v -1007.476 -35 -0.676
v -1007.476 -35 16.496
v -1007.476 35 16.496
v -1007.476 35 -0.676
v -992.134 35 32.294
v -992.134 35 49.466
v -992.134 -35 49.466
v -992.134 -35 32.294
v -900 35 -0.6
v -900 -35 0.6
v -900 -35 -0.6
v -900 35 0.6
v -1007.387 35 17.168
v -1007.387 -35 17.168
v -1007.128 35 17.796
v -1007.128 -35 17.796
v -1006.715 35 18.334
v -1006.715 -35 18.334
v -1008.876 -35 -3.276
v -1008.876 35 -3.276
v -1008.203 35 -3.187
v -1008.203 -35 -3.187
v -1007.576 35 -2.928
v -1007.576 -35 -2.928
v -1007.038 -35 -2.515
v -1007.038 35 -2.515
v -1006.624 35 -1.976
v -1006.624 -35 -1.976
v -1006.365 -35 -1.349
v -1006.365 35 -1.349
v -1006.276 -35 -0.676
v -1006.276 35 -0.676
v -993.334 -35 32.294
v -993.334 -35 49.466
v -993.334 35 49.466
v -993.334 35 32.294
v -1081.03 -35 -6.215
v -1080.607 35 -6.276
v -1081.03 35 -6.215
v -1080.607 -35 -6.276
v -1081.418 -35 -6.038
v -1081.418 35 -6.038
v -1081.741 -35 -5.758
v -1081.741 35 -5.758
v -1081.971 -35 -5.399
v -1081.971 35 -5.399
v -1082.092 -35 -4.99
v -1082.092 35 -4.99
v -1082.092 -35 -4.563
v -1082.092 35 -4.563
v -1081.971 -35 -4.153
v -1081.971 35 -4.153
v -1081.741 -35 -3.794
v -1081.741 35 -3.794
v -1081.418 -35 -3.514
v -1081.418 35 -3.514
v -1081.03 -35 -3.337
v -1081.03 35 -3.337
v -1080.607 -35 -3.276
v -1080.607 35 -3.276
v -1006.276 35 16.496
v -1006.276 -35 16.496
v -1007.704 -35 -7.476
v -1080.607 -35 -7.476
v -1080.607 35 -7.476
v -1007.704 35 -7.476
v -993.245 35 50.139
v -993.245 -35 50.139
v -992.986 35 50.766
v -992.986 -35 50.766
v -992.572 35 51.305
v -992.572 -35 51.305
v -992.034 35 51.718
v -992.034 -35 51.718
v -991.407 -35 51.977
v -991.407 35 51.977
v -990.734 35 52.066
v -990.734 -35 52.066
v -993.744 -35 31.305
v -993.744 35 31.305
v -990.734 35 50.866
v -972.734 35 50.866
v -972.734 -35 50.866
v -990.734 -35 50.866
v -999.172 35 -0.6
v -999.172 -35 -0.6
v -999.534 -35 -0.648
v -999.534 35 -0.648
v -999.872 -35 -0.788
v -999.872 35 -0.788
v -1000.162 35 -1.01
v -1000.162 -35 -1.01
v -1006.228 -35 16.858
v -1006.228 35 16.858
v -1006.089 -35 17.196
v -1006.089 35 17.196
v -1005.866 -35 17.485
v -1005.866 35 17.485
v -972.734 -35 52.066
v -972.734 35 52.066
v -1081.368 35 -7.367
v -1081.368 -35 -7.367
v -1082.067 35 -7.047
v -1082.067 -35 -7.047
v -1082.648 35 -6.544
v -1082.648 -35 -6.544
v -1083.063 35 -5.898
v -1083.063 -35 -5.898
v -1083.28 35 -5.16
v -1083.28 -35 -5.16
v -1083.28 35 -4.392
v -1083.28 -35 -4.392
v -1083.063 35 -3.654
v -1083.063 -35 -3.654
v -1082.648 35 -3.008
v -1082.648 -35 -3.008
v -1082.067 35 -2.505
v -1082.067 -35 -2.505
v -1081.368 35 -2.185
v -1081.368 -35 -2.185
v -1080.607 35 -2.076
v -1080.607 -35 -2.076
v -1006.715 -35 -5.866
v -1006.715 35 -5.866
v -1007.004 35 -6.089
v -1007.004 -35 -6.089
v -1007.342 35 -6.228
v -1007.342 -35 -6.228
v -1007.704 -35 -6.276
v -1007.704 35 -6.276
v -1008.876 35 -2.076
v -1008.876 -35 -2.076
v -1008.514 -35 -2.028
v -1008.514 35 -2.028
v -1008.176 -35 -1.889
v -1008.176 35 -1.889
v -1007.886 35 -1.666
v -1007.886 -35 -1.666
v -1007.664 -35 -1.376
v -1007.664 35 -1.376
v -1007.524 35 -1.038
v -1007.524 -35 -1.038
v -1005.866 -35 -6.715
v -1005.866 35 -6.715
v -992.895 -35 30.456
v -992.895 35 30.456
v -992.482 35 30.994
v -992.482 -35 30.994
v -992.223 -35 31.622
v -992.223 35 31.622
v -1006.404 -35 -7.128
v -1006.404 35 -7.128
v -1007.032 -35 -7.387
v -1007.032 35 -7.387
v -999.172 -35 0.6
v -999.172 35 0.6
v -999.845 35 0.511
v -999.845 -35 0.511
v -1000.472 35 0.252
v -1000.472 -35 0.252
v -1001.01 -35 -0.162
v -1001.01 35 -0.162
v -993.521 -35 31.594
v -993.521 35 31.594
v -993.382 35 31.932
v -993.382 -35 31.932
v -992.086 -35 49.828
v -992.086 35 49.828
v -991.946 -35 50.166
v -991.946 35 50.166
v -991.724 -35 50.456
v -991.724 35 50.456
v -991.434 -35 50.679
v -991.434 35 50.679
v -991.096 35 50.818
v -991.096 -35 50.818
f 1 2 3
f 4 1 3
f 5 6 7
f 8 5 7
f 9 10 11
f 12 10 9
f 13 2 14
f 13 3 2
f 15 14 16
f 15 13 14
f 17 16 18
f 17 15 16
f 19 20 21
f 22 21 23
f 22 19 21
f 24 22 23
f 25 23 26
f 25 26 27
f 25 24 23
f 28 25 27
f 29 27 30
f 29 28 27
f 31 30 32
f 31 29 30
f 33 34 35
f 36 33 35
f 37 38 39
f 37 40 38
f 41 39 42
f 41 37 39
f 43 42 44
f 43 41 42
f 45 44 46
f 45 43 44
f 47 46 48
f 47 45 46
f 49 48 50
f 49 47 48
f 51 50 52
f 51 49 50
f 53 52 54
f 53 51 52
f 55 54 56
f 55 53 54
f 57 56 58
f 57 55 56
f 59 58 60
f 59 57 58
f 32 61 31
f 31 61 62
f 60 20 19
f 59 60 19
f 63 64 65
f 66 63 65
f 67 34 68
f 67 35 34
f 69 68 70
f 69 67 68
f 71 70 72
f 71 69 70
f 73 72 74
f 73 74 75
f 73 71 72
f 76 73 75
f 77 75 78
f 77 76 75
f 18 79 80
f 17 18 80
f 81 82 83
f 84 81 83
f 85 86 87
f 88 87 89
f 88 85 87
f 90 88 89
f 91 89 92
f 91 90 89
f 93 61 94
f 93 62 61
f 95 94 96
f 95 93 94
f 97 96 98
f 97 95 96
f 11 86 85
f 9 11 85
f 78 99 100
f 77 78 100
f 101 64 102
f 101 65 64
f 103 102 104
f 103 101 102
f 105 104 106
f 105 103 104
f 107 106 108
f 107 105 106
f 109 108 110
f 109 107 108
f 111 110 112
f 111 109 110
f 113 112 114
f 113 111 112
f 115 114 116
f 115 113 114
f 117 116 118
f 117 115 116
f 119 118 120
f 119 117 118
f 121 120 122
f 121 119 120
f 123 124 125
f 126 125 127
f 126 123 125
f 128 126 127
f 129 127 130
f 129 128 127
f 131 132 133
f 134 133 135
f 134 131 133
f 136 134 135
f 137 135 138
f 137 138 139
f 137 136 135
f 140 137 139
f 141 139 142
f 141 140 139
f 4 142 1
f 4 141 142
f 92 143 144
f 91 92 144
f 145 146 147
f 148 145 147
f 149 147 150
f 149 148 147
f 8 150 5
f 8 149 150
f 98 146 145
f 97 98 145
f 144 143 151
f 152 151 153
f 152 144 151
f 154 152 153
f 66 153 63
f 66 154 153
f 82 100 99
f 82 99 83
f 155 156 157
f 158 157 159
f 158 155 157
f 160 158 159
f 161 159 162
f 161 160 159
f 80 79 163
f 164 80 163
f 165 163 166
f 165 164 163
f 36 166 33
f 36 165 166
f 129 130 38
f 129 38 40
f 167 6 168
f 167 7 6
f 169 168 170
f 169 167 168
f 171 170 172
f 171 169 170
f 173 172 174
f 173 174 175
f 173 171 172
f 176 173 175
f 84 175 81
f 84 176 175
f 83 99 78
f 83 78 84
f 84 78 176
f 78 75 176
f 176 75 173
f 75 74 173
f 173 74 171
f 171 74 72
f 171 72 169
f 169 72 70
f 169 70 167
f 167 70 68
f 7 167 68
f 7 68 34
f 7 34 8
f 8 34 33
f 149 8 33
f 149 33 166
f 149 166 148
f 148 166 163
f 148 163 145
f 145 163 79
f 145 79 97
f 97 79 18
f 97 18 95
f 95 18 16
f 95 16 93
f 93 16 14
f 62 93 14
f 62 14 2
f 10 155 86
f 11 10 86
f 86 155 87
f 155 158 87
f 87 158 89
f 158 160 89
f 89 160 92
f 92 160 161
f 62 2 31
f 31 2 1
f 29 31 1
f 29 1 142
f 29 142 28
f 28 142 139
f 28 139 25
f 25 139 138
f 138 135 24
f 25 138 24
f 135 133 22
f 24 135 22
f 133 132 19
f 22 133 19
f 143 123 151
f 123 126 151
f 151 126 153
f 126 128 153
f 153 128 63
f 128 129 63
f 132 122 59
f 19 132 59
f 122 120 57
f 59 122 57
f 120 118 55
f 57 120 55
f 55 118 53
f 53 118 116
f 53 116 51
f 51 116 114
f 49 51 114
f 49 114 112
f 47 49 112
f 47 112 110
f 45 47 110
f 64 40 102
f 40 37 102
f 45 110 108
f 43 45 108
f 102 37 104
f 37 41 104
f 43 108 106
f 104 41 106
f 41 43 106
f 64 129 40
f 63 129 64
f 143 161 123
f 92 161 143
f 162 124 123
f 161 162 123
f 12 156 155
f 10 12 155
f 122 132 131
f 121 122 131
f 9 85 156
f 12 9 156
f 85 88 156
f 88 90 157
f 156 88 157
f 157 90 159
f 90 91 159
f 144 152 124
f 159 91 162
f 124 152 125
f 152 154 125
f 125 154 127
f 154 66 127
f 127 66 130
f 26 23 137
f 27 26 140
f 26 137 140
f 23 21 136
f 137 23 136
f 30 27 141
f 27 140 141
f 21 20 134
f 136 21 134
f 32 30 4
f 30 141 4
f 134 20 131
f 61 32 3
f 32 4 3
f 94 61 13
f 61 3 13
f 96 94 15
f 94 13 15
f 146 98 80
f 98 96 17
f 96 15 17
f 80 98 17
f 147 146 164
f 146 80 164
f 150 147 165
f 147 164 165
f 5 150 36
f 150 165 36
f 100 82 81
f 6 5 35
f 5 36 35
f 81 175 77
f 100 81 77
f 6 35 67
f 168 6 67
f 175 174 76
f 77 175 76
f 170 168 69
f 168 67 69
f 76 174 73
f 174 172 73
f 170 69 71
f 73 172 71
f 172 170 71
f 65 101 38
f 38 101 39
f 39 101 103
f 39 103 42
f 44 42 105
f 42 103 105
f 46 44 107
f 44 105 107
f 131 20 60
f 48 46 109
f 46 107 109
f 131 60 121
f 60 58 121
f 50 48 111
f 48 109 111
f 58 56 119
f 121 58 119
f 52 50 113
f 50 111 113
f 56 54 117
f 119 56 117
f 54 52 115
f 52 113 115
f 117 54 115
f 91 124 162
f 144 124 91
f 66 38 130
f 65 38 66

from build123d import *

# Parameters (mm, degrees)
SKETCH1_W          = 70
SKETCH1_H          = 1.2
SKETCH4_W          = 70
SKETCH4_H          = 1.2
CUT_EXTRUDE3_DEPTH = 900


with BuildPart() as part:
    # Sweep1: sweep along a path in Sketch2
    with BuildLine(Plane(origin=(0, 0, 0), x_dir=(-1, 0, 0), z_dir=(0, 1, 0))) as sweep1_path:
        Line((0, 0), (999.171572875, 0))
        ThreePointArc((999.171572875, 0), (999.93693974, -0.152240935), (1000.585786438, -0.585786438))
        Line((1000.585786438, -0.585786438), (1006.290281407, -6.290281407))
        ThreePointArc((1006.290281407, -6.290281407), (1006.939128104, -6.723826909), (1007.704494969, -6.876067844))
        Line((1007.704494969, -6.876067844), (1080.606989687, -6.876067844))
        ThreePointArc((1080.606989687, -6.876067844), (1082.706989687, -4.776067844), (1080.606989687, -2.676067844))
        Line((1080.606989687, -2.676067844), (1008.876067844, -2.676067844))
        ThreePointArc((1008.876067844, -2.676067844), (1007.461854282, -2.090281407), (1006.876067844, -0.676067844))
        Line((1006.876067844, -0.676067844), (1006.876067844, 16.495505031))
        ThreePointArc((1006.876067844, 16.495505031), (1006.723826909, 17.260871896), (1006.290281407, 17.909718593))
        Line((1006.290281407, 17.909718593), (993.319718658, 30.880281342))
        ThreePointArc((993.319718658, 30.880281342), (992.886173156, 31.529128039), (992.733932221, 32.294494904))
        Line((992.733932221, 32.294494904), (992.733932221, 49.466067779))
        ThreePointArc((992.733932221, 49.466067779), (992.148145783, 50.880281342), (990.733932221, 51.466067779))
        Line((990.733932221, 51.466067779), (972.733932221, 51.466067779))
    # Sketch1 → Sweep1 (sweep)
    with BuildSketch(Plane.YZ):
        Rectangle(SKETCH1_W, SKETCH1_H)
    sweep(path=sweep1_path.line)

    # Sketch4 → Cut-Extrude3 (cut)
    with BuildSketch(Plane.YZ):
        Rectangle(SKETCH4_W, SKETCH4_H)
    extrude(amount=-CUT_EXTRUDE3_DEPTH, mode=Mode.SUBTRACT)


solid = part.part
